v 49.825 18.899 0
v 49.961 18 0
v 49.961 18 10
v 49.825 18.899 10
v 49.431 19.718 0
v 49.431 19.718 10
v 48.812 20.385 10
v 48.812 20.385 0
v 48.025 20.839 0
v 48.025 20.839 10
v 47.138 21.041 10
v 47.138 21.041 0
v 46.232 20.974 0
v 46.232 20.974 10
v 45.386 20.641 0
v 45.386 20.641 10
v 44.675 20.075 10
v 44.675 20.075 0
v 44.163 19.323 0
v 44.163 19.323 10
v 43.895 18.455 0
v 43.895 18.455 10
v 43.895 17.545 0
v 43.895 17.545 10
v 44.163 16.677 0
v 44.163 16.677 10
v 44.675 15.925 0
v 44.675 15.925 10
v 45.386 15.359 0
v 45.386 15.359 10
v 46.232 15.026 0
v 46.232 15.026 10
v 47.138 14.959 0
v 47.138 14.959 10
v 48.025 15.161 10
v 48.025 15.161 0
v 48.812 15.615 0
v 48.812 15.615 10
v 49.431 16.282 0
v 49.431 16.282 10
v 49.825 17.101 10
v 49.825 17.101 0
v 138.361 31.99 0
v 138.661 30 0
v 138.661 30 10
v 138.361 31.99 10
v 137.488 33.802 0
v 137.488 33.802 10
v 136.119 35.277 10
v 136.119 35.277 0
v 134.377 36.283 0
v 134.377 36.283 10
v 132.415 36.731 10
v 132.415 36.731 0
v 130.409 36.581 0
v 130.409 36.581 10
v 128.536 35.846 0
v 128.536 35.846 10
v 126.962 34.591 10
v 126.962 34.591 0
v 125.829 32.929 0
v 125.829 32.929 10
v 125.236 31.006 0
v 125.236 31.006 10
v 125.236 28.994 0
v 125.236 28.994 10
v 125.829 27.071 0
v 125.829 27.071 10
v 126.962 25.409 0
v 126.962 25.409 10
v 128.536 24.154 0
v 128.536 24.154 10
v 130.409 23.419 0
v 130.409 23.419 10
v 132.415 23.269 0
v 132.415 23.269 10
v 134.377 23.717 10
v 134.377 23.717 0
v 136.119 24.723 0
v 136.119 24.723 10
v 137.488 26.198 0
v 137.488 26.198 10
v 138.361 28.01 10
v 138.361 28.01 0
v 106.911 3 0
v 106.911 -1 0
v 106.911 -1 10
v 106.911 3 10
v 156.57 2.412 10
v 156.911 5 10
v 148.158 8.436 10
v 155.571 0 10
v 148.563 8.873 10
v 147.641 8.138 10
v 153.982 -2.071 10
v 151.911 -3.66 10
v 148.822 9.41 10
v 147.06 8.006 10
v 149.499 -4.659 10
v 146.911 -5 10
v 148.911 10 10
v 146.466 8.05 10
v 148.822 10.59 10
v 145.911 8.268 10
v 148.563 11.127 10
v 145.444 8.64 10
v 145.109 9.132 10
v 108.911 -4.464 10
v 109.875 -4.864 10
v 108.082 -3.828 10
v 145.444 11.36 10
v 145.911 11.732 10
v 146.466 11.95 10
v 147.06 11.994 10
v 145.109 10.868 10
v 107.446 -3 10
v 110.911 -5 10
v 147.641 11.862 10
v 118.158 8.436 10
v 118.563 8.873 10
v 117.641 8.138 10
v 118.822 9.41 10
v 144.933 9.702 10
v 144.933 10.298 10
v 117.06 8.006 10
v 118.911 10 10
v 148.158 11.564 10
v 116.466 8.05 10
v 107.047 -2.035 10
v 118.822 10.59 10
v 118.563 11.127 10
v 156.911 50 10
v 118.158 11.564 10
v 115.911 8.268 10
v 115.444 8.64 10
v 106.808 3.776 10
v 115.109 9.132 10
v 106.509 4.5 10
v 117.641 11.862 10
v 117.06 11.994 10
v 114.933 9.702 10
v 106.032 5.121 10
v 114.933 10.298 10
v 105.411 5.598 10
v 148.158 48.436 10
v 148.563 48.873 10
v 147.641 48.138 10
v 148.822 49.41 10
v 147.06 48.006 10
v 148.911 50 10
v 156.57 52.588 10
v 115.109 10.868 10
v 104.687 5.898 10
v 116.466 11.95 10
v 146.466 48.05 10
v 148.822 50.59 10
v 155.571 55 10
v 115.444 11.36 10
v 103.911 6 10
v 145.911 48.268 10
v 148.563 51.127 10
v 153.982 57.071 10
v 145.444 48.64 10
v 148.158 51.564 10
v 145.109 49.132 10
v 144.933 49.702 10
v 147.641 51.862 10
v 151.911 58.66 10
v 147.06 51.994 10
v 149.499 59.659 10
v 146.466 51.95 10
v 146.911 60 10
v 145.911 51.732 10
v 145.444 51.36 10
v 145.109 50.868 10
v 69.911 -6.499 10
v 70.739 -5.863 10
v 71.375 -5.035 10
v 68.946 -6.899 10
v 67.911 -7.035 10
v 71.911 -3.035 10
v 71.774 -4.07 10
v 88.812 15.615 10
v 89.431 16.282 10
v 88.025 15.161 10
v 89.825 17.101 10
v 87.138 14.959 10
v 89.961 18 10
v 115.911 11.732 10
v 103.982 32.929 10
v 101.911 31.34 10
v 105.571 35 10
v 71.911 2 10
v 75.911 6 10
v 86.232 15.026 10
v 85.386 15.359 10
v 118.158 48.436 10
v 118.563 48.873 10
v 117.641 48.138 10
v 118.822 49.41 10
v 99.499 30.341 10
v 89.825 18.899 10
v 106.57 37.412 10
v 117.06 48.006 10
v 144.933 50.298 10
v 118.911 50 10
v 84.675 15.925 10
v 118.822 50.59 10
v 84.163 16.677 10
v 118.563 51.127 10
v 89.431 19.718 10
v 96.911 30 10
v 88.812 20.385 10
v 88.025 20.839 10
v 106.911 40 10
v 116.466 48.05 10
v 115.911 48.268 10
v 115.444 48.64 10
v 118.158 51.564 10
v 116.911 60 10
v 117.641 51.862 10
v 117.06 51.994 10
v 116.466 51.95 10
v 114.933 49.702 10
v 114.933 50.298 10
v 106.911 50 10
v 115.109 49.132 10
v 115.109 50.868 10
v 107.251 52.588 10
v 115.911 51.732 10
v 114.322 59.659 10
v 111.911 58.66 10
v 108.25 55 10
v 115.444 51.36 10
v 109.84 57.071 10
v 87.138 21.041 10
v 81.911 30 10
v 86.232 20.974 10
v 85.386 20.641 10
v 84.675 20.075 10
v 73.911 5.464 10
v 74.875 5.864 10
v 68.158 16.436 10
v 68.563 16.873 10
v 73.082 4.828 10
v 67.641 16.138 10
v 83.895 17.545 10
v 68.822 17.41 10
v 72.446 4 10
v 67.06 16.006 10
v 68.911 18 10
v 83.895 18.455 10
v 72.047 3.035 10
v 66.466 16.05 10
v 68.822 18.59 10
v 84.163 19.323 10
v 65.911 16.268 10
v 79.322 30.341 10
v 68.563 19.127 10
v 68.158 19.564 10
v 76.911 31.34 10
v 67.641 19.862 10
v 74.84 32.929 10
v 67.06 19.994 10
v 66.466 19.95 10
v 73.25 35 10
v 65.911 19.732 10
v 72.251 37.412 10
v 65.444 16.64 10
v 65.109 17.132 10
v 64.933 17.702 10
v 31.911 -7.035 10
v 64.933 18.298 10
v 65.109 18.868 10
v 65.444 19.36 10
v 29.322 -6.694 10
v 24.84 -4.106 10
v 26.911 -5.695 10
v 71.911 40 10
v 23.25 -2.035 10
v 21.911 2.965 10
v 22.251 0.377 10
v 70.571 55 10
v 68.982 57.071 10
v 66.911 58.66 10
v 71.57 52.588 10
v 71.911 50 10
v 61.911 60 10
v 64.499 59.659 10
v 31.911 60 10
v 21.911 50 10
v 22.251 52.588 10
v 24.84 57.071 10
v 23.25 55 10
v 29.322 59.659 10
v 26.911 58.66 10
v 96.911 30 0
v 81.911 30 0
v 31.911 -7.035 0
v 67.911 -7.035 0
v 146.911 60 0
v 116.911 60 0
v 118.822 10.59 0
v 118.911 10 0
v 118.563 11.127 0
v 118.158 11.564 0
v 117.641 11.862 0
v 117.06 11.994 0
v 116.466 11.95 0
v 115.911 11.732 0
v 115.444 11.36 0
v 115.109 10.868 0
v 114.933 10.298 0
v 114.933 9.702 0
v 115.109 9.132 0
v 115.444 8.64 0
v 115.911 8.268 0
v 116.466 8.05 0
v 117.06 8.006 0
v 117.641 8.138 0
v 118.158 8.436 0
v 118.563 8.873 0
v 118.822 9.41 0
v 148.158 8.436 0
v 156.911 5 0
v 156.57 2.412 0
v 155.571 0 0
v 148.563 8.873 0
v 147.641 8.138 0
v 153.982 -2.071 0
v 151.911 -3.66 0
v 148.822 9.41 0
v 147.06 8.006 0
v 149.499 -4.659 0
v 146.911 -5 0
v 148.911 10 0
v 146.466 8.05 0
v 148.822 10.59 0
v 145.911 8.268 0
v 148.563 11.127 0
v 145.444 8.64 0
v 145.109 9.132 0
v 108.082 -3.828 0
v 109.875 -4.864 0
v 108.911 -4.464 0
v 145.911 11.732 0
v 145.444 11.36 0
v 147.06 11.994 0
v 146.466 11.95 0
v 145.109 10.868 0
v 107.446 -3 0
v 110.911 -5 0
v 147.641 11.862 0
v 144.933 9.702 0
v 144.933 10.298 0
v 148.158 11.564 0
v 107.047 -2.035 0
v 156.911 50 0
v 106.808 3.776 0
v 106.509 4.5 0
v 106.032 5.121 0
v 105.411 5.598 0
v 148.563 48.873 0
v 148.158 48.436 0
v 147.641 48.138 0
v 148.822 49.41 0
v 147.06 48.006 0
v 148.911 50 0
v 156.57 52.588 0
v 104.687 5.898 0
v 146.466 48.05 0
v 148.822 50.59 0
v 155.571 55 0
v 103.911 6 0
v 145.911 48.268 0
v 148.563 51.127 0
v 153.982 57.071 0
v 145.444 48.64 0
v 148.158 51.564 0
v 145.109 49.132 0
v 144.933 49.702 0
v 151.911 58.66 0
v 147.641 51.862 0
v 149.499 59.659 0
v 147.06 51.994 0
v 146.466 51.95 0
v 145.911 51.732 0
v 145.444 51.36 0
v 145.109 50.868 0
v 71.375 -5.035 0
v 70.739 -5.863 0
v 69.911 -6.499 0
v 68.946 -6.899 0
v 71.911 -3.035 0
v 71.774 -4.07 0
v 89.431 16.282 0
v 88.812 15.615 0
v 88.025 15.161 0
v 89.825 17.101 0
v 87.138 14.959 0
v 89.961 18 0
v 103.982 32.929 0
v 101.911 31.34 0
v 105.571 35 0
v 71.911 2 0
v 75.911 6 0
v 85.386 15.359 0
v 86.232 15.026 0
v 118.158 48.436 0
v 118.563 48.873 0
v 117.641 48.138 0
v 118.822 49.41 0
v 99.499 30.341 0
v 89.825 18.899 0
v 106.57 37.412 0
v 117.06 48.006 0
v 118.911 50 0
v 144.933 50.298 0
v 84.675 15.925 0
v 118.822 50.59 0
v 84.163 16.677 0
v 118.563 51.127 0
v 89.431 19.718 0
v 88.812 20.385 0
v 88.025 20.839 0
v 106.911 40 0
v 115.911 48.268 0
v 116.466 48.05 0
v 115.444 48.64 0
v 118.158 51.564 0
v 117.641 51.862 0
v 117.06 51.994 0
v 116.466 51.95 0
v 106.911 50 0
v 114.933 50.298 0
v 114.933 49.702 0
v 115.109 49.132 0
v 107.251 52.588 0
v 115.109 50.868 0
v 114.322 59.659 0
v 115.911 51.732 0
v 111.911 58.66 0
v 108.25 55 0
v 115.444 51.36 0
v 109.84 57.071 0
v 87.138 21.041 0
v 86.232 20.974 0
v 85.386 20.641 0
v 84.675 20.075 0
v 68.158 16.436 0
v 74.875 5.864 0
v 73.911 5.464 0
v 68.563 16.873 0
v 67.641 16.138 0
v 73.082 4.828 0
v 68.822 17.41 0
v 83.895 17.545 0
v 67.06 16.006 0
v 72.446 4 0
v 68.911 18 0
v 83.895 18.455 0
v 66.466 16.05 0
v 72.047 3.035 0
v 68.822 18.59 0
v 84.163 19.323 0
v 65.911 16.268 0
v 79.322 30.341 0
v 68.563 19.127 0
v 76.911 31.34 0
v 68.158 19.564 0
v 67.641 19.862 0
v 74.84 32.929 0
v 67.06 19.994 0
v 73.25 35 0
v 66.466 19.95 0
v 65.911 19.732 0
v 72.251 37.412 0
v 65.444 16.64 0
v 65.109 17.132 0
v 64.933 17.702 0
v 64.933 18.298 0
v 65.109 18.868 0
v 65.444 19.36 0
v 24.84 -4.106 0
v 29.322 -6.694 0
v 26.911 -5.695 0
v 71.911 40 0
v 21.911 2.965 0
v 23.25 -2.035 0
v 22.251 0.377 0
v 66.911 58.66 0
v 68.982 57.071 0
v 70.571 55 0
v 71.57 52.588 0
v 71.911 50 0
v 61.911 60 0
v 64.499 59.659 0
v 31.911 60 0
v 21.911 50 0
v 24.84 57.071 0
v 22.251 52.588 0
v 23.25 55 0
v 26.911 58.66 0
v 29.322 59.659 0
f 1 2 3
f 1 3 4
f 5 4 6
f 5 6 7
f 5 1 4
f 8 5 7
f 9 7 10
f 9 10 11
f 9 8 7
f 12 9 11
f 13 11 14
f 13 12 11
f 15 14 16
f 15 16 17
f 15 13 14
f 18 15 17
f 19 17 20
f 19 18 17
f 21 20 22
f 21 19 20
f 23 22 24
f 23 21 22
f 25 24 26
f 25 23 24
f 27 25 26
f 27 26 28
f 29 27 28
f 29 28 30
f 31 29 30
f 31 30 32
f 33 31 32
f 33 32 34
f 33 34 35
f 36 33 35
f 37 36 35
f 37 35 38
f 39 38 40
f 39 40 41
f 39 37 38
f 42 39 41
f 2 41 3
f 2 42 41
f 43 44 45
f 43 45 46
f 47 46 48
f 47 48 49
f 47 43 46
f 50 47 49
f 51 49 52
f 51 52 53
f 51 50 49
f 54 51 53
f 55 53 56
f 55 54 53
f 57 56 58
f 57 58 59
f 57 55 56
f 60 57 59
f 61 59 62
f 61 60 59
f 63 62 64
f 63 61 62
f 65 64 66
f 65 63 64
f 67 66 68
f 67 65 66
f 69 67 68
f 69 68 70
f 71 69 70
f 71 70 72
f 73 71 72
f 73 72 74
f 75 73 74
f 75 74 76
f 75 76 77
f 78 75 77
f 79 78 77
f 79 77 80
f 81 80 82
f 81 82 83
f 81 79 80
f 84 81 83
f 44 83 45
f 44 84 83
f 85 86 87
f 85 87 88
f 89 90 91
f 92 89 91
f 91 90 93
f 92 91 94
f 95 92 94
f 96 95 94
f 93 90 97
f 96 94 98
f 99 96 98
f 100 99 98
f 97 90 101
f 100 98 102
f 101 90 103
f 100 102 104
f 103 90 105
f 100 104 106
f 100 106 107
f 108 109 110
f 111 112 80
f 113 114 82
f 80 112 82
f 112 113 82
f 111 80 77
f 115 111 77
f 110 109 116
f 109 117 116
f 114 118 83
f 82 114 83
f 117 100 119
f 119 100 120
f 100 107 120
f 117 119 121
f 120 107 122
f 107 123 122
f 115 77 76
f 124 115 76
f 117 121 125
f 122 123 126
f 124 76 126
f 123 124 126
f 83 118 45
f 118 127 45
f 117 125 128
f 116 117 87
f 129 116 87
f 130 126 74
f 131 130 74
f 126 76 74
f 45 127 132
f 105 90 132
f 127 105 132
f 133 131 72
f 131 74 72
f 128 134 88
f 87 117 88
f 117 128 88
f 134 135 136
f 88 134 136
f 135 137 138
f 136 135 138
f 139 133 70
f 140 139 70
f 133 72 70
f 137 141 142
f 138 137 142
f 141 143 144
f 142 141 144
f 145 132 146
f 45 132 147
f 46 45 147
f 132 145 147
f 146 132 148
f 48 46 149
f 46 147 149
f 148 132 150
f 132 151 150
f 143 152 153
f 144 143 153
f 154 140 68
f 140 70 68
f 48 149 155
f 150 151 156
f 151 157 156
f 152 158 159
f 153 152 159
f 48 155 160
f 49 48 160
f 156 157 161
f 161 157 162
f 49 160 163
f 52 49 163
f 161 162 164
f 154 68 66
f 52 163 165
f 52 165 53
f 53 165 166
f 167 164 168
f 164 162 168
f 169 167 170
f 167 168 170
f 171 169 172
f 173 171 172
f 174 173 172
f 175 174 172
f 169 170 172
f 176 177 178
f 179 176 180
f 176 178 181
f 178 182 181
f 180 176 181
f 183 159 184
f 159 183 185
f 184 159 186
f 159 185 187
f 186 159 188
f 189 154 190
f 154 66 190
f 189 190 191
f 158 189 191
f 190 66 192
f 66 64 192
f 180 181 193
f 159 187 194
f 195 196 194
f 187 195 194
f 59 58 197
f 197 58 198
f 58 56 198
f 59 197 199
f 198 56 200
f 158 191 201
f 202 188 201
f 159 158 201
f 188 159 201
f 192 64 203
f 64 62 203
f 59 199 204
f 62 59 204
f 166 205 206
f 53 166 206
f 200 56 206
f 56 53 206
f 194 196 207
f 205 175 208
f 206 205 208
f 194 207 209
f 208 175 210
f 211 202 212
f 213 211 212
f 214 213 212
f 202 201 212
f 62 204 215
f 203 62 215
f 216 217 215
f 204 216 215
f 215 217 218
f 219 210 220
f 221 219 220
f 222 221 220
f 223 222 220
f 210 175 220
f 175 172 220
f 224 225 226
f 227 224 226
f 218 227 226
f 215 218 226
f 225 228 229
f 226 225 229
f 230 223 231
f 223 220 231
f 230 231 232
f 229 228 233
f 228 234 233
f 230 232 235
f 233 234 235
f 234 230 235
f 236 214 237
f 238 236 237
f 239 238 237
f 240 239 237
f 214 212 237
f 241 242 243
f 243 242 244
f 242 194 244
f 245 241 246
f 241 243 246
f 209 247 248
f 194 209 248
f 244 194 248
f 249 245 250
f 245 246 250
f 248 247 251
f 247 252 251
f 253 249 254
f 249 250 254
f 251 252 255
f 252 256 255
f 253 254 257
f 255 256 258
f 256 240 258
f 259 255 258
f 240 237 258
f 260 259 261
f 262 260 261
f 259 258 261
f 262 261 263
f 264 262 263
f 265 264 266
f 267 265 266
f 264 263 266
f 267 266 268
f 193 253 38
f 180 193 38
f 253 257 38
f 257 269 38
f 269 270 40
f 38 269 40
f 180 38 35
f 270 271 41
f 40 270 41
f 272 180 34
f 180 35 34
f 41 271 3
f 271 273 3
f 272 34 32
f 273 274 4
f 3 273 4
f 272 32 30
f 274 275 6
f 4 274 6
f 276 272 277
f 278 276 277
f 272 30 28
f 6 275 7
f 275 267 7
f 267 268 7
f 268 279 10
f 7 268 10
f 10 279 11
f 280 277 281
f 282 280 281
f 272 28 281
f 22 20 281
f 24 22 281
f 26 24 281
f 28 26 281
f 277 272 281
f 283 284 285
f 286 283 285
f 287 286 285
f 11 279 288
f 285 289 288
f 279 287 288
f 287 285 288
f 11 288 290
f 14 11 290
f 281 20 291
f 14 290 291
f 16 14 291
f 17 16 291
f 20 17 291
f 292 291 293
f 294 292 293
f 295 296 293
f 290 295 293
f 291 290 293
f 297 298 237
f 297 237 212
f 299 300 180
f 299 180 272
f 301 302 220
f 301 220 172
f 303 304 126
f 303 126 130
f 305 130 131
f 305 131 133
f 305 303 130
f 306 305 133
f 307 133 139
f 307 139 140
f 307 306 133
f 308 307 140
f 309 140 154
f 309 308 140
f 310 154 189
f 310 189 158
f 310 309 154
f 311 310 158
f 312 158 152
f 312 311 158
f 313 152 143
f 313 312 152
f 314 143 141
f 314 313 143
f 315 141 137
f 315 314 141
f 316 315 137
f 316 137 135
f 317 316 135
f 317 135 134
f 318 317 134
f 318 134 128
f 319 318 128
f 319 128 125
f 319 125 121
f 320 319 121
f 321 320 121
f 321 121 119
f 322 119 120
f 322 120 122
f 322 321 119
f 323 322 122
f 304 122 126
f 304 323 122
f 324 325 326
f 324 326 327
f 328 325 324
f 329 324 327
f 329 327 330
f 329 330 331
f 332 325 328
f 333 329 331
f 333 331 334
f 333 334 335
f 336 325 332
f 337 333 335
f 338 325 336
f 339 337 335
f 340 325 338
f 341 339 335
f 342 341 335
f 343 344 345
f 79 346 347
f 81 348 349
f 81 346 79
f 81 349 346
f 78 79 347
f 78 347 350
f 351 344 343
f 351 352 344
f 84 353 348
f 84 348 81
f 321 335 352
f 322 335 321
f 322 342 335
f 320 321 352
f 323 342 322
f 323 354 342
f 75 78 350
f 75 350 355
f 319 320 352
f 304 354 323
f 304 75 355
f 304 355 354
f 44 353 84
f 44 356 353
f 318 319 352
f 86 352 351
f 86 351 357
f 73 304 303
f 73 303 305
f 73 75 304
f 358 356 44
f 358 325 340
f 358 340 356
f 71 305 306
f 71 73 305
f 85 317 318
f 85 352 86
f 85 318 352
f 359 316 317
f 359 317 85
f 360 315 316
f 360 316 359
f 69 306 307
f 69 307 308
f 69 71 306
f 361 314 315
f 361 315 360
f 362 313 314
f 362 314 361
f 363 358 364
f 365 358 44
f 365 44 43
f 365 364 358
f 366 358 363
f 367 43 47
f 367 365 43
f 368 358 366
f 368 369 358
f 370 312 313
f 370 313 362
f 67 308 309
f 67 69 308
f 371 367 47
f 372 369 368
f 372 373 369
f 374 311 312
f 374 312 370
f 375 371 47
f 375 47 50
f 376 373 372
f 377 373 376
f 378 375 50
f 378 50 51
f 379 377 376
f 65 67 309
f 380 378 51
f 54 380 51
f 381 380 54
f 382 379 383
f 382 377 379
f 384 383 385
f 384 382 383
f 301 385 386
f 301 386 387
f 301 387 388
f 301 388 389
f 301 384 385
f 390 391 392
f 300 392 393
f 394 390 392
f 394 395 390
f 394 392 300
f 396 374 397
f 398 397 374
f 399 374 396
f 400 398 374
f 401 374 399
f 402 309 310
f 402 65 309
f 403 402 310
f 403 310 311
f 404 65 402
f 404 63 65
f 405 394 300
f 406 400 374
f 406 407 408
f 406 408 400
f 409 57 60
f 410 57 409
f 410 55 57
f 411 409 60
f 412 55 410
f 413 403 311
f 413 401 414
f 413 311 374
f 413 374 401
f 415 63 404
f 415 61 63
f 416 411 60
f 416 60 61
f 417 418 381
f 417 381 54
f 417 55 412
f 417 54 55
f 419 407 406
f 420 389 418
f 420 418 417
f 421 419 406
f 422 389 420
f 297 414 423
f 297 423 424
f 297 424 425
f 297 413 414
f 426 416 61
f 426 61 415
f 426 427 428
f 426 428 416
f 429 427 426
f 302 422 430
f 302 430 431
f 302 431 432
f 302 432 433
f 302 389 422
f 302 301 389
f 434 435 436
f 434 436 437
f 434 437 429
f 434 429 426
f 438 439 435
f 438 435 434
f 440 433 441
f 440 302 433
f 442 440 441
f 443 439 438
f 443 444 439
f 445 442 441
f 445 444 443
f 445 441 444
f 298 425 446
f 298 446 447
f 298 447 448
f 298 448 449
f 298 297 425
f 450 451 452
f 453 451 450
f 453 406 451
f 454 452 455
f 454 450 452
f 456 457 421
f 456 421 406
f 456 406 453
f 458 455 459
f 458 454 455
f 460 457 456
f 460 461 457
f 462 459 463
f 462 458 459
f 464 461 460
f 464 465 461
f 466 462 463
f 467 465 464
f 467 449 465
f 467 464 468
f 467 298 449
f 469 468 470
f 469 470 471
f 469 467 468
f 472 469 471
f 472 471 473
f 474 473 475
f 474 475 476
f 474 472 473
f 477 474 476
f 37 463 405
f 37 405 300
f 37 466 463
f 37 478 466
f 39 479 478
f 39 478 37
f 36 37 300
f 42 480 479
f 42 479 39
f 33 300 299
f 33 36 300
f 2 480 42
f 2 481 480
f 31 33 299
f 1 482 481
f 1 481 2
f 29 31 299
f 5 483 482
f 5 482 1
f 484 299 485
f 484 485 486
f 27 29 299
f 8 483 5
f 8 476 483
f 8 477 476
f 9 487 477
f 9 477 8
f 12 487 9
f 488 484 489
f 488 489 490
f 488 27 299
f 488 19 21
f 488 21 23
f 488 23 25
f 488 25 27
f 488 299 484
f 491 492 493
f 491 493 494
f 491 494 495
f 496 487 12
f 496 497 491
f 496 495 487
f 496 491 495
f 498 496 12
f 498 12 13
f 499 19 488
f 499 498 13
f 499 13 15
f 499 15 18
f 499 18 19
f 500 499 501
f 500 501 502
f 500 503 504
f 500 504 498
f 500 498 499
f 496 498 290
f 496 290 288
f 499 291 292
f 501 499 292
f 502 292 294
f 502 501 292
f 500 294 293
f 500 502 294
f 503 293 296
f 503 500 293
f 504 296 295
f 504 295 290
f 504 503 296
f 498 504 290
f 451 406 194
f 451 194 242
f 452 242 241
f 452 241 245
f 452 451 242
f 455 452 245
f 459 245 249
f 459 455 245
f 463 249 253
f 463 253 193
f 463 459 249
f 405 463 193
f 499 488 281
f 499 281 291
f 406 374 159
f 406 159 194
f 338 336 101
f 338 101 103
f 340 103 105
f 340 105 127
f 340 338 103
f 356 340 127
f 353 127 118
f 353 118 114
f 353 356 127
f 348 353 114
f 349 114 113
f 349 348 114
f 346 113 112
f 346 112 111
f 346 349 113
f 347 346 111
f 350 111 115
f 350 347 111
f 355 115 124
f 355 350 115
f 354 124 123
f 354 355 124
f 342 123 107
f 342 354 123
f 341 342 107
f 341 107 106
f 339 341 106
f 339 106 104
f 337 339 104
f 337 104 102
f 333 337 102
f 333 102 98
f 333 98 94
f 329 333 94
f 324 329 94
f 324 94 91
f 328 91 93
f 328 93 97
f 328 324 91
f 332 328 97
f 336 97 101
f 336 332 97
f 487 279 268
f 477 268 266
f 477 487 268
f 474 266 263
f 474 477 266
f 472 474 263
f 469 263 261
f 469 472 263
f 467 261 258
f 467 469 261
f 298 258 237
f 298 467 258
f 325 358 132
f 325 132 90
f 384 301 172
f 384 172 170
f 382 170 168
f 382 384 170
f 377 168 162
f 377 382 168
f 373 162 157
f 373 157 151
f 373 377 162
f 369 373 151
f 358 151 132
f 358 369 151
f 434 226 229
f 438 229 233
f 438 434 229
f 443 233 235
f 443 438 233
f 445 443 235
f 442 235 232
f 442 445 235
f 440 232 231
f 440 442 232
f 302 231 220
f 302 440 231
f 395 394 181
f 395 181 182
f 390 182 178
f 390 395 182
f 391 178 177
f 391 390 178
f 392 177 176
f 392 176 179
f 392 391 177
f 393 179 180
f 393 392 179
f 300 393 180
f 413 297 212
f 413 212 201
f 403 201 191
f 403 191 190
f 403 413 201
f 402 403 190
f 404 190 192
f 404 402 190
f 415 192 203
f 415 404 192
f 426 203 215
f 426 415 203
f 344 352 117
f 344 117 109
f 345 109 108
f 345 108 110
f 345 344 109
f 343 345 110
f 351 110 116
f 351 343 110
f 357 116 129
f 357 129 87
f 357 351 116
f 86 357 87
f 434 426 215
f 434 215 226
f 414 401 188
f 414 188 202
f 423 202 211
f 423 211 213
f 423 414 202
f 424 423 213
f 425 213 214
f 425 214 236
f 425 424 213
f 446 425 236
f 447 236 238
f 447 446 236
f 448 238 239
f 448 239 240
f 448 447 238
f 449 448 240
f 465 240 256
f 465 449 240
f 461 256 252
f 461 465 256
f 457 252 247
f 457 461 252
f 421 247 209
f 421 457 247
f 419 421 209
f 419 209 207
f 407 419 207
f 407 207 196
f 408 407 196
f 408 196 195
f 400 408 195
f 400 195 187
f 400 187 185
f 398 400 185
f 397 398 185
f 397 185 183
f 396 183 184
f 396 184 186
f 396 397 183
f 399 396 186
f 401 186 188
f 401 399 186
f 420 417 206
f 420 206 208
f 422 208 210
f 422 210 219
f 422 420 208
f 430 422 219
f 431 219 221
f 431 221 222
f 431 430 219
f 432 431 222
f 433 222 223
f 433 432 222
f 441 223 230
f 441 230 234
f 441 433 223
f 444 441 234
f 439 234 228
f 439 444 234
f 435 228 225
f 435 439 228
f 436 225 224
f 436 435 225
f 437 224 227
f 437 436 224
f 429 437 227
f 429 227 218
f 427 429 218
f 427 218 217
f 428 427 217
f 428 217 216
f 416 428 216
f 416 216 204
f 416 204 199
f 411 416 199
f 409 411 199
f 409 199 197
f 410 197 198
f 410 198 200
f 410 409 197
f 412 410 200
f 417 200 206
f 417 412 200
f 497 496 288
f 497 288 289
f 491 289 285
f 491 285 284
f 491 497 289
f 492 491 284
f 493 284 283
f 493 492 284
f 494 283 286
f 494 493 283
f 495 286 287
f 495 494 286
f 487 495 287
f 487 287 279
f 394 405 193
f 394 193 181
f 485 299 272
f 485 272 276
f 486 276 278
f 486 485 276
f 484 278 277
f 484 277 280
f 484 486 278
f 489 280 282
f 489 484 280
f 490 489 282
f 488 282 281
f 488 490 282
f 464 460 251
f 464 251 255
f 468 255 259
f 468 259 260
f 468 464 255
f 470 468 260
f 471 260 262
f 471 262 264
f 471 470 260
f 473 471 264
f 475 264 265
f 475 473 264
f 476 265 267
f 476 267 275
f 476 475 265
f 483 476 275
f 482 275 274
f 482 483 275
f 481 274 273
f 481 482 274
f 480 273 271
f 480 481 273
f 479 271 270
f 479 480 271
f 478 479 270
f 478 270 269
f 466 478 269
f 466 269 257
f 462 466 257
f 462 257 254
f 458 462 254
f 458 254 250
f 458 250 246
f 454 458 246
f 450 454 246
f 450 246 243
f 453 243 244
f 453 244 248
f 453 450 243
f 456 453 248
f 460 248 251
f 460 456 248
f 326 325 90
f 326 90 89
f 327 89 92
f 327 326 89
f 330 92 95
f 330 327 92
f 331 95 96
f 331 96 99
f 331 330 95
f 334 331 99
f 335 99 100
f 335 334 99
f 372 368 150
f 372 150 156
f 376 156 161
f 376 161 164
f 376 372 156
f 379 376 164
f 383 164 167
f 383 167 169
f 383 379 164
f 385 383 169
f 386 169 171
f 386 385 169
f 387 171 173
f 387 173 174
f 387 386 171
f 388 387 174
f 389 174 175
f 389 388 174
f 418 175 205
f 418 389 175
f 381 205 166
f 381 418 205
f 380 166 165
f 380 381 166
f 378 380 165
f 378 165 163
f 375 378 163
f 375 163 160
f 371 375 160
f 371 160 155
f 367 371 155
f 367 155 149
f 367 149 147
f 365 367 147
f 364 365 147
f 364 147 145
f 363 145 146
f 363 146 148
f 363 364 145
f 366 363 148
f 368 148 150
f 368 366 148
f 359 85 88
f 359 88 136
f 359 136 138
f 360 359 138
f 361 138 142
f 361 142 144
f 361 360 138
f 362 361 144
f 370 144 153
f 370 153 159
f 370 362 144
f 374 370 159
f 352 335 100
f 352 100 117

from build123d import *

# Parameters (mm, degrees)
MODEL_R             = 2
MODEL_R_2           = 3.05
MODEL_R_3           = 6.75
BOSS_EXTRUDE1_DEPTH = 10


with BuildPart() as part:
    # Model → Boss-Extrude1 (new body)
    with BuildSketch(Plane.XY):
        with BuildLine():
            Line((106.910569106, -1), (106.910569106, 3))
            ThreePointArc((106.910569106, 3), (106.031889449, 5.121320344), (103.910569106, 6))
            Line((103.910569106, 6), (75.910569106, 6))
            ThreePointArc((75.910569106, 6), (73.082141981, 4.828427125), (71.910569106, 2))
            Line((71.910569106, 2), (71.910569106, -3.03491552))
            ThreePointArc((71.910569106, -3.03491552), (70.73899623, -5.863342645), (67.910569106, -7.034915521))
            Line((67.910569106, -7.034915521), (31.910569106, -7.034915521))
            ThreePointArc((31.910569106, -7.034915521), (24.839501294, -4.105983332), (21.910569106, 2.96508448))
            Line((21.910569106, 2.96508448), (21.910569106, 50))
            ThreePointArc((21.910569106, 50), (24.839501294, 57.071067812), (31.910569106, 60))
            Line((31.910569106, 60), (61.910569106, 60))
            ThreePointArc((61.910569106, 60), (68.981636918, 57.071067812), (71.910569106, 50))
            Line((71.910569106, 50), (71.910569106, 40))
            ThreePointArc((71.910569106, 40), (74.839501294, 32.928932188), (81.910569106, 30))
            Line((81.910569106, 30), (96.910569106, 30))
            ThreePointArc((96.910569106, 30), (103.981636918, 32.928932188), (106.910569106, 40))
            Line((106.910569106, 40), (106.910569106, 50))
            ThreePointArc((106.910569106, 50), (109.839501294, 57.071067812), (116.910569106, 60))
            Line((116.910569106, 60), (146.910569106, 60))
            ThreePointArc((146.910569106, 60), (153.981636918, 57.071067812), (156.910569106, 50))
            Line((156.910569106, 50), (156.910569106, 5))
            ThreePointArc((156.910569106, 5), (153.981636918, -2.071067812), (146.910569106, -5))
            Line((146.910569106, -5), (110.910569106, -5))
            ThreePointArc((110.910569106, -5), (108.082141981, -3.828427125), (106.910569106, -1))
        make_face()
        with Locations((66.910569106, 18)):
            Circle(MODEL_R, mode=Mode.SUBTRACT)
        with Locations((46.910569106, 18)):
            Circle(MODEL_R_2, mode=Mode.SUBTRACT)
        with Locations((116.910569106, 10)):
            Circle(MODEL_R, mode=Mode.SUBTRACT)
        with Locations((146.910569106, 10)):
            Circle(MODEL_R, mode=Mode.SUBTRACT)
        with Locations((146.910569106, 50)):
            Circle(MODEL_R, mode=Mode.SUBTRACT)
        with Locations((116.910569106, 50)):
            Circle(MODEL_R, mode=Mode.SUBTRACT)
        with Locations((131.910569106, 30)):
            Circle(MODEL_R_3, mode=Mode.SUBTRACT)
        with Locations((86.910569106, 18)):
            Circle(MODEL_R_2, mode=Mode.SUBTRACT)
    extrude(amount=BOSS_EXTRUDE1_DEPTH)


solid = part.part
